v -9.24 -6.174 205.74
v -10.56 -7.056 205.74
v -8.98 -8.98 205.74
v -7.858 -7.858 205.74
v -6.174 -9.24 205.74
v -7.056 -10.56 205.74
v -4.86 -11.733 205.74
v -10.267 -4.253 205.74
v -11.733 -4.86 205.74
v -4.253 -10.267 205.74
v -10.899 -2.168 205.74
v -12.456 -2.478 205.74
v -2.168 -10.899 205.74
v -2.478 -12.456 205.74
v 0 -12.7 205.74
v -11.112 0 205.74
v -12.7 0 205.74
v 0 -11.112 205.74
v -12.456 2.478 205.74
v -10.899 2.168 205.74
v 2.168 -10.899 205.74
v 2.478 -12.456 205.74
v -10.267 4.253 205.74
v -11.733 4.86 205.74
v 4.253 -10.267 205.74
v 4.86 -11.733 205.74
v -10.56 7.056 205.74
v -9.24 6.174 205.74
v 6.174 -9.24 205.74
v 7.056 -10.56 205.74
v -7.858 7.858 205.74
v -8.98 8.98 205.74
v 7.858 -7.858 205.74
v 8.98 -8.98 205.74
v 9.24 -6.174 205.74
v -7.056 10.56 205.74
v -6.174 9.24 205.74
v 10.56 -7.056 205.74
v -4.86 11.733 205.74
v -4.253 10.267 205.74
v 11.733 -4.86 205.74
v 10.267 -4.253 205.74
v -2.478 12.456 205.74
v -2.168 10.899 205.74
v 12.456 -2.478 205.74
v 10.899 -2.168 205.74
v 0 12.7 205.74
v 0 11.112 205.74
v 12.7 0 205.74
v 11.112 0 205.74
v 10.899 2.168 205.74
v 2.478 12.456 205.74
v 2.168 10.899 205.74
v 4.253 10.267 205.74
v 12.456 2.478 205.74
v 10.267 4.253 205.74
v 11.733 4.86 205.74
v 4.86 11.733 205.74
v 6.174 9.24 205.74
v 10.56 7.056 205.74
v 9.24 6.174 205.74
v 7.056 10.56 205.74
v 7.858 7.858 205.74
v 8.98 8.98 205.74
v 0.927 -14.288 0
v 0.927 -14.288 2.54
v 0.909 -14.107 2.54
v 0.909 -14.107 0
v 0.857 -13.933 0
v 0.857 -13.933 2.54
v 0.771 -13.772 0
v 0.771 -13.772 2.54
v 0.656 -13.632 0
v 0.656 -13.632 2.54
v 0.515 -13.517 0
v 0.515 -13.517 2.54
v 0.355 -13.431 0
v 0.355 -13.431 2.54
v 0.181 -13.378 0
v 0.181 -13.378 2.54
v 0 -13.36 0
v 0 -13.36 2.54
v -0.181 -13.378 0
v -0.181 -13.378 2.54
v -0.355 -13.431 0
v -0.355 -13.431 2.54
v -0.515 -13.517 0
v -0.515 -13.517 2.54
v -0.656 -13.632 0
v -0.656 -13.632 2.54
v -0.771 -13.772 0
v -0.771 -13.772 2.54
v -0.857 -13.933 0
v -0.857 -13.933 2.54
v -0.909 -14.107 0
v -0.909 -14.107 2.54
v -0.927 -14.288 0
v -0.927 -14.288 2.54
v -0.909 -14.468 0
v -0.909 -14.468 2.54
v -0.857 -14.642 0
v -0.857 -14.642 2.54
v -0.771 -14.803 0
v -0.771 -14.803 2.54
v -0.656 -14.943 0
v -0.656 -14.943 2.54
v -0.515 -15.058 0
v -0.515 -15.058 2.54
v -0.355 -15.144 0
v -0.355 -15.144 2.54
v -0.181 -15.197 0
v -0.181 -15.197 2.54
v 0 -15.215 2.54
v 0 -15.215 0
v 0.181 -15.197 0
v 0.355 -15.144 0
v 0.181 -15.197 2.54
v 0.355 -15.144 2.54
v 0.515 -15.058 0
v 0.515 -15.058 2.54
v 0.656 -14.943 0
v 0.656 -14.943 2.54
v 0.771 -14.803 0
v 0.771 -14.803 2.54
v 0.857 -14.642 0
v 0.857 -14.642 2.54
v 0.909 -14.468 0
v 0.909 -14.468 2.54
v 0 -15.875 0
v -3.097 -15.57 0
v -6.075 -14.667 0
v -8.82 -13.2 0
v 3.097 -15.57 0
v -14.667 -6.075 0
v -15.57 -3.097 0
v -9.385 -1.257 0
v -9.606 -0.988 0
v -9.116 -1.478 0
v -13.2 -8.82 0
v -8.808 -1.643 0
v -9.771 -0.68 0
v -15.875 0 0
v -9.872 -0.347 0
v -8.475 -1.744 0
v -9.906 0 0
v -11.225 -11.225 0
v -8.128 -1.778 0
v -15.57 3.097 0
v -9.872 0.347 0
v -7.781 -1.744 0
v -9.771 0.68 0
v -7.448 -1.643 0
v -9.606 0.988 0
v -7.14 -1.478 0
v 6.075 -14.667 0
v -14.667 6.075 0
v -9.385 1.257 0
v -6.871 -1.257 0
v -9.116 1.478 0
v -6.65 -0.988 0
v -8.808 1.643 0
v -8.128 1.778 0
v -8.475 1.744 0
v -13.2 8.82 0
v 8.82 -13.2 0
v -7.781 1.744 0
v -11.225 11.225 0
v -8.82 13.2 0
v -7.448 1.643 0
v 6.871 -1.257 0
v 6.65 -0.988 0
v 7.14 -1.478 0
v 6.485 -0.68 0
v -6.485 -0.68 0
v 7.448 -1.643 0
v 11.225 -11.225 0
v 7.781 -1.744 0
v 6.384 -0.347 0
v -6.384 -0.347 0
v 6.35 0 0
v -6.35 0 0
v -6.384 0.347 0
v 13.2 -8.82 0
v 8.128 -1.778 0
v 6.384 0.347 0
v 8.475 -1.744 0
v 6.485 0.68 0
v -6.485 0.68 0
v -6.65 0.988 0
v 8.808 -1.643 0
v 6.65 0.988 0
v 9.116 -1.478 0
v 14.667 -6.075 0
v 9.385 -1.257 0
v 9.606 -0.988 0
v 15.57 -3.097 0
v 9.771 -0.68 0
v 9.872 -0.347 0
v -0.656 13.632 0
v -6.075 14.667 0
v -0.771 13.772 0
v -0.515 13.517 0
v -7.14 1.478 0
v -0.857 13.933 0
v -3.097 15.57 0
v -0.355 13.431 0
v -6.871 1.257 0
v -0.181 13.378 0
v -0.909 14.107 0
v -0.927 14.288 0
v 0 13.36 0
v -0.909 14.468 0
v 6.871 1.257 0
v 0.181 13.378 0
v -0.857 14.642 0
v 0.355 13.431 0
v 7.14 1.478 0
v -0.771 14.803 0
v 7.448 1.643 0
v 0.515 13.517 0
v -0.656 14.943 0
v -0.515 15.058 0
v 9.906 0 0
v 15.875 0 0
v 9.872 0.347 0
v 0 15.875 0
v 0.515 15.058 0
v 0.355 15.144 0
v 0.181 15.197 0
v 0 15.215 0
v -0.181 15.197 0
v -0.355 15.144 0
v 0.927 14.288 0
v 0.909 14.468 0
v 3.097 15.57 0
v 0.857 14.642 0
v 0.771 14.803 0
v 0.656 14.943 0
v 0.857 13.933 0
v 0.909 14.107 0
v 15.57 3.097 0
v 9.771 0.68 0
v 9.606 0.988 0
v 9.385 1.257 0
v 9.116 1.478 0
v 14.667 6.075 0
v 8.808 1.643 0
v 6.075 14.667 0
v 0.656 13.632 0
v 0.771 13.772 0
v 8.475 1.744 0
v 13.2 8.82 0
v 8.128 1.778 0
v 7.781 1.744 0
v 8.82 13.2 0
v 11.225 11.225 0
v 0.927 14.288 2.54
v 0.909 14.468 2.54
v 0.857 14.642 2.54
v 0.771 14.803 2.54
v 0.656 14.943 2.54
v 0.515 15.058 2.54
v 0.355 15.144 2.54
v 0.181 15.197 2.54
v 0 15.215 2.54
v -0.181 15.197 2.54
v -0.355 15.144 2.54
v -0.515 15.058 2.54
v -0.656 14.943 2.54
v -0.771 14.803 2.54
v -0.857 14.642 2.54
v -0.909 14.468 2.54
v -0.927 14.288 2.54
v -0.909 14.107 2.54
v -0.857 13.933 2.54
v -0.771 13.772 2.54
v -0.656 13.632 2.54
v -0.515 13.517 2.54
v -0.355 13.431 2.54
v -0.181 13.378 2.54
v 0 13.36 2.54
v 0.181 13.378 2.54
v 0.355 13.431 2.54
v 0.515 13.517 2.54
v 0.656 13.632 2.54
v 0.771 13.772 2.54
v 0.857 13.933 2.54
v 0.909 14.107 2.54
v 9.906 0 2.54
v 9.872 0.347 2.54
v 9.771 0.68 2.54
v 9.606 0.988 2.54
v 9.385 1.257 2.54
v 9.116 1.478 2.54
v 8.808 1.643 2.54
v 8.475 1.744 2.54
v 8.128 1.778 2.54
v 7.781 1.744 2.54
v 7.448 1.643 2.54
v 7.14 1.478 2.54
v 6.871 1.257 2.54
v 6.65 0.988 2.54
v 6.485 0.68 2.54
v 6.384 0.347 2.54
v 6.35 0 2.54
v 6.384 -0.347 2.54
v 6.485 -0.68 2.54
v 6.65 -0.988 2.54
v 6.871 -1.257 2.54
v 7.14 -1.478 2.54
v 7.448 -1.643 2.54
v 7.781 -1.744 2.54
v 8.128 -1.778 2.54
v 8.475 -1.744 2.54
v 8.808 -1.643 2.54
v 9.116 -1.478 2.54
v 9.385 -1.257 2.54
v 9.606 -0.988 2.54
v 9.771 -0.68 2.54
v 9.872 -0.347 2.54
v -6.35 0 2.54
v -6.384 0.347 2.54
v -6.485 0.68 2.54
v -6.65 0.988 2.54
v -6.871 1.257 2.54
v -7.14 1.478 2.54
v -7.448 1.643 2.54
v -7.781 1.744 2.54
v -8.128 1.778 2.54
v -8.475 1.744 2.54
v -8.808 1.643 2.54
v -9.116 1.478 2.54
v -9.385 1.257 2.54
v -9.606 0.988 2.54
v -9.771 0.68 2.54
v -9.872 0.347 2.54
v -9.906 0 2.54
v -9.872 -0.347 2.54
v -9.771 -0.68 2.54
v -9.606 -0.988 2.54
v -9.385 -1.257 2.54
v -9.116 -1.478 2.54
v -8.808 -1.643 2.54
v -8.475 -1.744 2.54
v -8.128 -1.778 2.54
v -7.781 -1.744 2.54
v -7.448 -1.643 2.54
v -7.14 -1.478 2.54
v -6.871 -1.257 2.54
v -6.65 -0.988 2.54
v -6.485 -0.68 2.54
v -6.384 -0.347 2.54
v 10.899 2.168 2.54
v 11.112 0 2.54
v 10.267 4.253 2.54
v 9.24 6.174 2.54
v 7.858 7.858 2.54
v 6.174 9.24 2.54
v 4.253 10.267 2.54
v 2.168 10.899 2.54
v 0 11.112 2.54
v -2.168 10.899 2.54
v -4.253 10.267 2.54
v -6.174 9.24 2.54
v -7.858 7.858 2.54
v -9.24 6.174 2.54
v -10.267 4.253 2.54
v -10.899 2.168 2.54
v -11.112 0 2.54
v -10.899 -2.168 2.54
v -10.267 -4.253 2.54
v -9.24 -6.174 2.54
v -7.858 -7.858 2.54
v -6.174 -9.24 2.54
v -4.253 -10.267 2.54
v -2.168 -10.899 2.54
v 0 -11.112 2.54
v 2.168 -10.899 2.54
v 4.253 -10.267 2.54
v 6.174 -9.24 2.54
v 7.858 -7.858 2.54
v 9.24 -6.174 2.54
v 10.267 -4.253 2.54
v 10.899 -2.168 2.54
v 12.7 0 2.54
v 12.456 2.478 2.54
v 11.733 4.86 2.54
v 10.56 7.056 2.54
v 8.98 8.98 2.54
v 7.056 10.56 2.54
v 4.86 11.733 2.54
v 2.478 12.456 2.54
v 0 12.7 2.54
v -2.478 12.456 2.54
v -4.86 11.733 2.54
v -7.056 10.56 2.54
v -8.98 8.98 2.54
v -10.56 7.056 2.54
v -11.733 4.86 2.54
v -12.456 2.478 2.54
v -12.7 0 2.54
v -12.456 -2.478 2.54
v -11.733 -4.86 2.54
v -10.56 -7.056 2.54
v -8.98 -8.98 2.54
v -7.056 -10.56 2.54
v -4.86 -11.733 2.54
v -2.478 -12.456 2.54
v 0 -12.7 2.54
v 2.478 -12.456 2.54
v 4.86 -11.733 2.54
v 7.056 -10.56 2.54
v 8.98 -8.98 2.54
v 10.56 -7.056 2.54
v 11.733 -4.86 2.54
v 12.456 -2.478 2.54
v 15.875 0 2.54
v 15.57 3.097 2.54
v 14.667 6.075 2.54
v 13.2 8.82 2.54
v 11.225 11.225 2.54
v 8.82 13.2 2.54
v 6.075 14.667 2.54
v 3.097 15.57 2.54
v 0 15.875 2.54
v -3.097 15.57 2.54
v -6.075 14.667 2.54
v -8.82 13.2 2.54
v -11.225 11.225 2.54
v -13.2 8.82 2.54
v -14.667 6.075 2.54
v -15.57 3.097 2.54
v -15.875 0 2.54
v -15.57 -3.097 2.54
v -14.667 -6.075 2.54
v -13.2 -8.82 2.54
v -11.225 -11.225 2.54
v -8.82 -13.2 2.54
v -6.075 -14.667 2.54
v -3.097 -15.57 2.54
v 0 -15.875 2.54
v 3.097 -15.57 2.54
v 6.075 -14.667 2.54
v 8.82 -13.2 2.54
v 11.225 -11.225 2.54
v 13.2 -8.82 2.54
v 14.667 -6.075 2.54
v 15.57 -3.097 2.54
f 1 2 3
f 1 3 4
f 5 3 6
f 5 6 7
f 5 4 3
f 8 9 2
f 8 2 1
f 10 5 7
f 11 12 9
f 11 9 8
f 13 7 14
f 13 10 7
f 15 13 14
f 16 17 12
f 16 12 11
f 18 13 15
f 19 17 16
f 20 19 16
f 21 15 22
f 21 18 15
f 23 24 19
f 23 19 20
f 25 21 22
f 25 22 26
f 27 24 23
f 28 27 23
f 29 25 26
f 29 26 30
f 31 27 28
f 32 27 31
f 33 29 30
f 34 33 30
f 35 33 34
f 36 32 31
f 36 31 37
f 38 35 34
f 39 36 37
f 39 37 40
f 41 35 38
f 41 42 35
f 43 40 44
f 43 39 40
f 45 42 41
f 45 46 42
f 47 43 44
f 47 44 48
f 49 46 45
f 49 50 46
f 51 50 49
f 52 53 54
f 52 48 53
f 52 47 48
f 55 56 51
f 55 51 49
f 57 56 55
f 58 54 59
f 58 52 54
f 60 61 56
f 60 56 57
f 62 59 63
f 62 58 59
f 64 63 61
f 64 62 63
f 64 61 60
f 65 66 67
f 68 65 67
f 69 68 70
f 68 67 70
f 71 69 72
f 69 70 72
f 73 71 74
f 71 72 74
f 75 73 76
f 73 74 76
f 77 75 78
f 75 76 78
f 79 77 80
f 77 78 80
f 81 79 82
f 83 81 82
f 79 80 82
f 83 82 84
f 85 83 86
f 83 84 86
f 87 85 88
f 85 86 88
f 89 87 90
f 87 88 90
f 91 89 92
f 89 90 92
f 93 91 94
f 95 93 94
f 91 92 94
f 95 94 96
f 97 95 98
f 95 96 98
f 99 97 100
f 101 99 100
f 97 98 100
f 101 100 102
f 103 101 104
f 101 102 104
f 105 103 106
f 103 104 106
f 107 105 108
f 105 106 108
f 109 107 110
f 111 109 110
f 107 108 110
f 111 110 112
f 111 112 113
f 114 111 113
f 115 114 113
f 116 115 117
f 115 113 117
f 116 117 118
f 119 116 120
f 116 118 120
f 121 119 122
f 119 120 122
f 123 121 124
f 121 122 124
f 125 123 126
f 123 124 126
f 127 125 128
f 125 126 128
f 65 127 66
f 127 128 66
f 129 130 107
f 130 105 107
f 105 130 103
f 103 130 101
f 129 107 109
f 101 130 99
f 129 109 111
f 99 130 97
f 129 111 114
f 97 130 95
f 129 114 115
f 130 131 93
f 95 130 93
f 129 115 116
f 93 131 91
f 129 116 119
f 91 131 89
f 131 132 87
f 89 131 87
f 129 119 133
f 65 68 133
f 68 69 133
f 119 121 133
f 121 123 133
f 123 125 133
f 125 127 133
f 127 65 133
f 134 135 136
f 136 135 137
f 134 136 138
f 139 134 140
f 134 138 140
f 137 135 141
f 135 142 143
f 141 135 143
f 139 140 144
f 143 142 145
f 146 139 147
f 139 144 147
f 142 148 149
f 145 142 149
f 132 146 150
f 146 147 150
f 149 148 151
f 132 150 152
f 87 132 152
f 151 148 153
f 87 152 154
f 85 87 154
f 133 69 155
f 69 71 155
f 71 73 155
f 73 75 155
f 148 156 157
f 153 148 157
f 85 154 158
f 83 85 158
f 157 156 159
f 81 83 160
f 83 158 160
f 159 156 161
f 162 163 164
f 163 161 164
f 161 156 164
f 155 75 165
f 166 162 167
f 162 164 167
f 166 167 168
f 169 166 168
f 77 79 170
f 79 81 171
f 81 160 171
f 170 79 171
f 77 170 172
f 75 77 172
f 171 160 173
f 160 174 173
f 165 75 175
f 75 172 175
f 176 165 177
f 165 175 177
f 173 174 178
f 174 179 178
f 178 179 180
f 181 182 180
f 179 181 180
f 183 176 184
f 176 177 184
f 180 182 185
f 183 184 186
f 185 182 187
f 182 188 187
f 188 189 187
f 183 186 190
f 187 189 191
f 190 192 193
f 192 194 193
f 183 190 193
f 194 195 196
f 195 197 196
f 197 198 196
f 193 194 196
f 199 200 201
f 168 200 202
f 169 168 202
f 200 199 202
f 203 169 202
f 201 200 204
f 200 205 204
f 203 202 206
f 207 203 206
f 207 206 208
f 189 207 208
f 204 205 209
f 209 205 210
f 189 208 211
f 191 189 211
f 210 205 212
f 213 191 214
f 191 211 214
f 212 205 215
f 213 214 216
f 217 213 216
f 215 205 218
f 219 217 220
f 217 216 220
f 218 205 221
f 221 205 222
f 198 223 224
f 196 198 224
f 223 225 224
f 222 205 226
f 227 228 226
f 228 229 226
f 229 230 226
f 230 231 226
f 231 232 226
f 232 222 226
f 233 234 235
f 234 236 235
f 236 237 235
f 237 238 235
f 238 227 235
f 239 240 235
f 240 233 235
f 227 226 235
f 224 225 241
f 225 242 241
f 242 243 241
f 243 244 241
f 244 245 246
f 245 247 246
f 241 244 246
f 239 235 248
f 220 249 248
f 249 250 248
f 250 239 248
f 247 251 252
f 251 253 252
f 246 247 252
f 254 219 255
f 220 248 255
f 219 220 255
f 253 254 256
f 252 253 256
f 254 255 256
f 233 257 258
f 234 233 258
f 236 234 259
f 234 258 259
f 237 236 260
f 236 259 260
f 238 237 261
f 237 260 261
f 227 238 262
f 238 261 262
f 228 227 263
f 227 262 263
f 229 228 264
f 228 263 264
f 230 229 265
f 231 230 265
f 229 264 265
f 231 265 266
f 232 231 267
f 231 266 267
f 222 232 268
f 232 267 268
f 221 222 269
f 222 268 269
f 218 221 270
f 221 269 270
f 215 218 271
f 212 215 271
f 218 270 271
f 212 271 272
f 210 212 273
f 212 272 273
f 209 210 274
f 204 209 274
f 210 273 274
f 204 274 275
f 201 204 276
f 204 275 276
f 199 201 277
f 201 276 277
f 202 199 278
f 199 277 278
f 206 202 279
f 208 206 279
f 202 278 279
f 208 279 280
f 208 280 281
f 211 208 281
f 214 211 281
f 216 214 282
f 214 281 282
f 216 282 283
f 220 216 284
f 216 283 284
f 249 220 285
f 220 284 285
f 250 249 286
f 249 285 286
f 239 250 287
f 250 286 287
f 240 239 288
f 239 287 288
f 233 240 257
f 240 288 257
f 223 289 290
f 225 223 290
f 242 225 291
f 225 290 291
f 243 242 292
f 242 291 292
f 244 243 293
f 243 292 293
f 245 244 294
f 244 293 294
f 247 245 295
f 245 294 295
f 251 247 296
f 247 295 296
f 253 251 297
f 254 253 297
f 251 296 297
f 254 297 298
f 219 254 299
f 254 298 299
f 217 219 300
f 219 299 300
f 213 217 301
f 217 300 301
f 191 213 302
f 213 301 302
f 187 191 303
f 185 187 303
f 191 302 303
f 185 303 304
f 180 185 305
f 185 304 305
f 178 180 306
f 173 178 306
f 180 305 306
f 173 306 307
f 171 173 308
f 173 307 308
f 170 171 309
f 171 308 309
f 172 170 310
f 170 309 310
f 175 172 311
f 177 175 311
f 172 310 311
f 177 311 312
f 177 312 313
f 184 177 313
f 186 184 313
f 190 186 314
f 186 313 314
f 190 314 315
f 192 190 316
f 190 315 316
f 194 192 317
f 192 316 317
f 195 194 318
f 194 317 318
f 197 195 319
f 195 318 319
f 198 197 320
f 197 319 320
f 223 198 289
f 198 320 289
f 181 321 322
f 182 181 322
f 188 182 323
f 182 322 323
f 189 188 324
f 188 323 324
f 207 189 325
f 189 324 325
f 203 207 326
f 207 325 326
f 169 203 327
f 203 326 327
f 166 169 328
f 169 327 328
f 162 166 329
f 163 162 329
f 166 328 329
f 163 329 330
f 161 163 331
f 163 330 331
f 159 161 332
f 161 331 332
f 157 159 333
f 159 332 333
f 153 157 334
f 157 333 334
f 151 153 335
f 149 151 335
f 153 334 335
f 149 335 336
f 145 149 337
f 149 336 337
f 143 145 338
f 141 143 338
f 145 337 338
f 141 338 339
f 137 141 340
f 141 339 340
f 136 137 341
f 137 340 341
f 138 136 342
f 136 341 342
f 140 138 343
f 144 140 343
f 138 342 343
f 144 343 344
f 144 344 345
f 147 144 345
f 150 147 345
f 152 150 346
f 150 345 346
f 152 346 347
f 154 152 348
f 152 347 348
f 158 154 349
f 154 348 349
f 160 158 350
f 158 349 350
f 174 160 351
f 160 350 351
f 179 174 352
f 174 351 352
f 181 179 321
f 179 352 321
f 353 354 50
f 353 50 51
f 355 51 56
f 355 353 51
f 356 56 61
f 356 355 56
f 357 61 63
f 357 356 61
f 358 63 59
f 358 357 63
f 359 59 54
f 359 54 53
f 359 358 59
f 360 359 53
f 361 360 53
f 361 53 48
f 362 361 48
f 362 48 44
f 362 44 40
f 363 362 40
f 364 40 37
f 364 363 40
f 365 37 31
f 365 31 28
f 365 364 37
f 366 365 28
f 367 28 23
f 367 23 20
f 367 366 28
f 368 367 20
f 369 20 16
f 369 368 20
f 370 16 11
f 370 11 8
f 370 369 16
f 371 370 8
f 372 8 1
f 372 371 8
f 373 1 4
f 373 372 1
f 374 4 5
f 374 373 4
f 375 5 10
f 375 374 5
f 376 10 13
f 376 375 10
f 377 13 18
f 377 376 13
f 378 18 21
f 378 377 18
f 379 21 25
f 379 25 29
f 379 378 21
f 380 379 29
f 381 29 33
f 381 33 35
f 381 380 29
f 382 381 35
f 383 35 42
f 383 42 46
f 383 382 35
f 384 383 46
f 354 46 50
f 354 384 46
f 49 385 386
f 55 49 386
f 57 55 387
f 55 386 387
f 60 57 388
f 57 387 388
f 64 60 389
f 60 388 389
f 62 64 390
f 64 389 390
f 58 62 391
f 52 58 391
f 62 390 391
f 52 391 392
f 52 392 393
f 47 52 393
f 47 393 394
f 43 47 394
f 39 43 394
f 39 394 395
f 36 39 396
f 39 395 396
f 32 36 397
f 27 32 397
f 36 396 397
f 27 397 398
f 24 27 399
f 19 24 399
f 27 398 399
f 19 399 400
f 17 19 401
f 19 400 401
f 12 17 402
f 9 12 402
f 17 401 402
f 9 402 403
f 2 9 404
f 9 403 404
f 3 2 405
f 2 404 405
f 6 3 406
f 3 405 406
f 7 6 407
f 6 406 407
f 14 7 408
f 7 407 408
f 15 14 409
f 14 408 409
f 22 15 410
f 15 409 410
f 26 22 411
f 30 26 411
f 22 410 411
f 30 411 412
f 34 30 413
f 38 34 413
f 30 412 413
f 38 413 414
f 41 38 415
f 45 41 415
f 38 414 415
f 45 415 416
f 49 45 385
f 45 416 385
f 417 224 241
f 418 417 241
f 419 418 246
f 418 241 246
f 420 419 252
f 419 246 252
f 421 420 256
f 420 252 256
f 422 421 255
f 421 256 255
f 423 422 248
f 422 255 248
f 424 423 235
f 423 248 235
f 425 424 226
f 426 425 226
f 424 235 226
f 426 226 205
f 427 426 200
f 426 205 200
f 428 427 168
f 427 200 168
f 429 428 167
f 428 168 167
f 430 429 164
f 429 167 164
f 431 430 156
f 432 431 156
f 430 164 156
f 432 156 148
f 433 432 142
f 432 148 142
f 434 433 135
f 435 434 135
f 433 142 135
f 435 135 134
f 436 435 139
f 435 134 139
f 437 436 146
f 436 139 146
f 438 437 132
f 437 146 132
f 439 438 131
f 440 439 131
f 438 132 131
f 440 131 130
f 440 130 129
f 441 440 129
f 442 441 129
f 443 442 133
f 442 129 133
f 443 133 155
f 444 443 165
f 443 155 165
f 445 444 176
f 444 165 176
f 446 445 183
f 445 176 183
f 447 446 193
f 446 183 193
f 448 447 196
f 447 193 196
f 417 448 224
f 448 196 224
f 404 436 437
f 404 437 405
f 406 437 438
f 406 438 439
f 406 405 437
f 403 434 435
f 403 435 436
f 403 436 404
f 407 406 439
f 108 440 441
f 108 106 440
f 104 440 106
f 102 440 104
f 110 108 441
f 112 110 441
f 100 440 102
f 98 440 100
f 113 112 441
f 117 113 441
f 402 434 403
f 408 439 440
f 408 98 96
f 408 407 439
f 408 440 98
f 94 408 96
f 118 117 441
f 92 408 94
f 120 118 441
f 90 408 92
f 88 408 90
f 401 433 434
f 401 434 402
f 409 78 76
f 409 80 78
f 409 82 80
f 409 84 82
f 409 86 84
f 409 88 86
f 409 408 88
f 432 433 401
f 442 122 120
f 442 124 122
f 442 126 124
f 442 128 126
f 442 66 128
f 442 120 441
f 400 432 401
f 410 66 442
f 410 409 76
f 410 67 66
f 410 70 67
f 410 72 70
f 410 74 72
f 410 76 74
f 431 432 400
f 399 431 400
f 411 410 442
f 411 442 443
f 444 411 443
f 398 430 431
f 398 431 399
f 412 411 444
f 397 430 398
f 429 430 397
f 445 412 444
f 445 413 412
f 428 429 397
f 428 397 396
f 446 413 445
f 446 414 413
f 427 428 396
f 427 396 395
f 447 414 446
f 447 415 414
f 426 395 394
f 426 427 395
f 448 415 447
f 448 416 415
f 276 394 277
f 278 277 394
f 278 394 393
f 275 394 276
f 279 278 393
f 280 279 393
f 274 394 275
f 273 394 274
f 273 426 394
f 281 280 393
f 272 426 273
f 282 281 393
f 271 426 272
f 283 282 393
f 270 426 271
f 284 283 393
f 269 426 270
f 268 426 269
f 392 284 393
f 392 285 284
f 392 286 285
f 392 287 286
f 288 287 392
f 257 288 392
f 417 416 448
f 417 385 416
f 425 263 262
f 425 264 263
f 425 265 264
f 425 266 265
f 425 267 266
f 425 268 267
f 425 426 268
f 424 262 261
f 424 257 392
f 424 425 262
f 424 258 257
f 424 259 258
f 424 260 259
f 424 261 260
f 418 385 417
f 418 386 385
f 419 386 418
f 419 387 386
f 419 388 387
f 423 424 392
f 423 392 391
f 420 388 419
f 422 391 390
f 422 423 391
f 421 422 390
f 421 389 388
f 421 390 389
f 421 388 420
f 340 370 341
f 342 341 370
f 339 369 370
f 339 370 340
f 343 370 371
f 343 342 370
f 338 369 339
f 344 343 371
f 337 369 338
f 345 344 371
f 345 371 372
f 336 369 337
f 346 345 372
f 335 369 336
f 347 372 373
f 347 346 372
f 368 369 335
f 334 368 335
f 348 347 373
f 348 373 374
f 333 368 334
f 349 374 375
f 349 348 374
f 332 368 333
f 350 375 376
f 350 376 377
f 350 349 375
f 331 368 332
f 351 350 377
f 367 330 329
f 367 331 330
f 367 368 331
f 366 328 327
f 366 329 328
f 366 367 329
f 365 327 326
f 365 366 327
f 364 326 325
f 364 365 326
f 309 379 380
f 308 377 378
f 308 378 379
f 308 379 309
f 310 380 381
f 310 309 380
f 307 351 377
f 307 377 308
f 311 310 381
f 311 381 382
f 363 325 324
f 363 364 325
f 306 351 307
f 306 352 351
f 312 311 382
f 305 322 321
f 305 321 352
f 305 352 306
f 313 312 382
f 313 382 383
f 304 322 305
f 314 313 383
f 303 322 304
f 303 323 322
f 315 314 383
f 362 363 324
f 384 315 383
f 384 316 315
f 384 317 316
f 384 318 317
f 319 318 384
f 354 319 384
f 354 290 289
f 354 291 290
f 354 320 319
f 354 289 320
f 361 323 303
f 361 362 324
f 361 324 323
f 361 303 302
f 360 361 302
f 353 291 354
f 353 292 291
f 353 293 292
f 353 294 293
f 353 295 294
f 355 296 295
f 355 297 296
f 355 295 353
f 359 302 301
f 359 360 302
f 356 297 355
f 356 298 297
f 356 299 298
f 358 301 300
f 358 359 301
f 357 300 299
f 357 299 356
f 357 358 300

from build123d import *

# Parameters (mm, degrees)
SKETCH1_R           = 15.875
BOSS_EXTRUDE1_DEPTH = 2.54
SKETCH2_R           = 12.7
SKETCH2_R_2         = 11.1125
BOSS_EXTRUDE2_DEPTH = 203.2
SKETCH3_R           = 1.778
CUT_EXTRUDE1_DEPTH  = 2.54
SKETCH4_R           = 0.9271
CUT_EXTRUDE2_DEPTH  = 2.54


with BuildPart() as part:
    # Sketch1 → Boss-Extrude1 (new body)
    with BuildSketch(Plane.XY):
        Circle(SKETCH1_R)
    extrude(amount=BOSS_EXTRUDE1_DEPTH)

    # Sketch2 → Boss-Extrude2 (add)
    with BuildSketch(Plane.XY.offset(2.54)):
        Circle(SKETCH2_R)
        Circle(SKETCH2_R_2, mode=Mode.SUBTRACT)
    extrude(amount=BOSS_EXTRUDE2_DEPTH)

    # Sketch3 → Cut-Extrude1 (cut)
    with BuildSketch(Plane.XY.offset(2.54)):
        with Locations((-8.128, 0)):
            Circle(SKETCH3_R)
        with Locations((8.128, 0)):
            Circle(SKETCH3_R)
    extrude(amount=-CUT_EXTRUDE1_DEPTH, mode=Mode.SUBTRACT)

    # Sketch4 → Cut-Extrude2 (cut)
    with BuildSketch(Plane.XY.offset(2.54)):
        with Locations((0, 14.2875)):
            Circle(SKETCH4_R)
        with Locations((0, -14.2875)):
            Circle(SKETCH4_R)
    extrude(amount=-CUT_EXTRUDE2_DEPTH, mode=Mode.SUBTRACT)


solid = part.part
